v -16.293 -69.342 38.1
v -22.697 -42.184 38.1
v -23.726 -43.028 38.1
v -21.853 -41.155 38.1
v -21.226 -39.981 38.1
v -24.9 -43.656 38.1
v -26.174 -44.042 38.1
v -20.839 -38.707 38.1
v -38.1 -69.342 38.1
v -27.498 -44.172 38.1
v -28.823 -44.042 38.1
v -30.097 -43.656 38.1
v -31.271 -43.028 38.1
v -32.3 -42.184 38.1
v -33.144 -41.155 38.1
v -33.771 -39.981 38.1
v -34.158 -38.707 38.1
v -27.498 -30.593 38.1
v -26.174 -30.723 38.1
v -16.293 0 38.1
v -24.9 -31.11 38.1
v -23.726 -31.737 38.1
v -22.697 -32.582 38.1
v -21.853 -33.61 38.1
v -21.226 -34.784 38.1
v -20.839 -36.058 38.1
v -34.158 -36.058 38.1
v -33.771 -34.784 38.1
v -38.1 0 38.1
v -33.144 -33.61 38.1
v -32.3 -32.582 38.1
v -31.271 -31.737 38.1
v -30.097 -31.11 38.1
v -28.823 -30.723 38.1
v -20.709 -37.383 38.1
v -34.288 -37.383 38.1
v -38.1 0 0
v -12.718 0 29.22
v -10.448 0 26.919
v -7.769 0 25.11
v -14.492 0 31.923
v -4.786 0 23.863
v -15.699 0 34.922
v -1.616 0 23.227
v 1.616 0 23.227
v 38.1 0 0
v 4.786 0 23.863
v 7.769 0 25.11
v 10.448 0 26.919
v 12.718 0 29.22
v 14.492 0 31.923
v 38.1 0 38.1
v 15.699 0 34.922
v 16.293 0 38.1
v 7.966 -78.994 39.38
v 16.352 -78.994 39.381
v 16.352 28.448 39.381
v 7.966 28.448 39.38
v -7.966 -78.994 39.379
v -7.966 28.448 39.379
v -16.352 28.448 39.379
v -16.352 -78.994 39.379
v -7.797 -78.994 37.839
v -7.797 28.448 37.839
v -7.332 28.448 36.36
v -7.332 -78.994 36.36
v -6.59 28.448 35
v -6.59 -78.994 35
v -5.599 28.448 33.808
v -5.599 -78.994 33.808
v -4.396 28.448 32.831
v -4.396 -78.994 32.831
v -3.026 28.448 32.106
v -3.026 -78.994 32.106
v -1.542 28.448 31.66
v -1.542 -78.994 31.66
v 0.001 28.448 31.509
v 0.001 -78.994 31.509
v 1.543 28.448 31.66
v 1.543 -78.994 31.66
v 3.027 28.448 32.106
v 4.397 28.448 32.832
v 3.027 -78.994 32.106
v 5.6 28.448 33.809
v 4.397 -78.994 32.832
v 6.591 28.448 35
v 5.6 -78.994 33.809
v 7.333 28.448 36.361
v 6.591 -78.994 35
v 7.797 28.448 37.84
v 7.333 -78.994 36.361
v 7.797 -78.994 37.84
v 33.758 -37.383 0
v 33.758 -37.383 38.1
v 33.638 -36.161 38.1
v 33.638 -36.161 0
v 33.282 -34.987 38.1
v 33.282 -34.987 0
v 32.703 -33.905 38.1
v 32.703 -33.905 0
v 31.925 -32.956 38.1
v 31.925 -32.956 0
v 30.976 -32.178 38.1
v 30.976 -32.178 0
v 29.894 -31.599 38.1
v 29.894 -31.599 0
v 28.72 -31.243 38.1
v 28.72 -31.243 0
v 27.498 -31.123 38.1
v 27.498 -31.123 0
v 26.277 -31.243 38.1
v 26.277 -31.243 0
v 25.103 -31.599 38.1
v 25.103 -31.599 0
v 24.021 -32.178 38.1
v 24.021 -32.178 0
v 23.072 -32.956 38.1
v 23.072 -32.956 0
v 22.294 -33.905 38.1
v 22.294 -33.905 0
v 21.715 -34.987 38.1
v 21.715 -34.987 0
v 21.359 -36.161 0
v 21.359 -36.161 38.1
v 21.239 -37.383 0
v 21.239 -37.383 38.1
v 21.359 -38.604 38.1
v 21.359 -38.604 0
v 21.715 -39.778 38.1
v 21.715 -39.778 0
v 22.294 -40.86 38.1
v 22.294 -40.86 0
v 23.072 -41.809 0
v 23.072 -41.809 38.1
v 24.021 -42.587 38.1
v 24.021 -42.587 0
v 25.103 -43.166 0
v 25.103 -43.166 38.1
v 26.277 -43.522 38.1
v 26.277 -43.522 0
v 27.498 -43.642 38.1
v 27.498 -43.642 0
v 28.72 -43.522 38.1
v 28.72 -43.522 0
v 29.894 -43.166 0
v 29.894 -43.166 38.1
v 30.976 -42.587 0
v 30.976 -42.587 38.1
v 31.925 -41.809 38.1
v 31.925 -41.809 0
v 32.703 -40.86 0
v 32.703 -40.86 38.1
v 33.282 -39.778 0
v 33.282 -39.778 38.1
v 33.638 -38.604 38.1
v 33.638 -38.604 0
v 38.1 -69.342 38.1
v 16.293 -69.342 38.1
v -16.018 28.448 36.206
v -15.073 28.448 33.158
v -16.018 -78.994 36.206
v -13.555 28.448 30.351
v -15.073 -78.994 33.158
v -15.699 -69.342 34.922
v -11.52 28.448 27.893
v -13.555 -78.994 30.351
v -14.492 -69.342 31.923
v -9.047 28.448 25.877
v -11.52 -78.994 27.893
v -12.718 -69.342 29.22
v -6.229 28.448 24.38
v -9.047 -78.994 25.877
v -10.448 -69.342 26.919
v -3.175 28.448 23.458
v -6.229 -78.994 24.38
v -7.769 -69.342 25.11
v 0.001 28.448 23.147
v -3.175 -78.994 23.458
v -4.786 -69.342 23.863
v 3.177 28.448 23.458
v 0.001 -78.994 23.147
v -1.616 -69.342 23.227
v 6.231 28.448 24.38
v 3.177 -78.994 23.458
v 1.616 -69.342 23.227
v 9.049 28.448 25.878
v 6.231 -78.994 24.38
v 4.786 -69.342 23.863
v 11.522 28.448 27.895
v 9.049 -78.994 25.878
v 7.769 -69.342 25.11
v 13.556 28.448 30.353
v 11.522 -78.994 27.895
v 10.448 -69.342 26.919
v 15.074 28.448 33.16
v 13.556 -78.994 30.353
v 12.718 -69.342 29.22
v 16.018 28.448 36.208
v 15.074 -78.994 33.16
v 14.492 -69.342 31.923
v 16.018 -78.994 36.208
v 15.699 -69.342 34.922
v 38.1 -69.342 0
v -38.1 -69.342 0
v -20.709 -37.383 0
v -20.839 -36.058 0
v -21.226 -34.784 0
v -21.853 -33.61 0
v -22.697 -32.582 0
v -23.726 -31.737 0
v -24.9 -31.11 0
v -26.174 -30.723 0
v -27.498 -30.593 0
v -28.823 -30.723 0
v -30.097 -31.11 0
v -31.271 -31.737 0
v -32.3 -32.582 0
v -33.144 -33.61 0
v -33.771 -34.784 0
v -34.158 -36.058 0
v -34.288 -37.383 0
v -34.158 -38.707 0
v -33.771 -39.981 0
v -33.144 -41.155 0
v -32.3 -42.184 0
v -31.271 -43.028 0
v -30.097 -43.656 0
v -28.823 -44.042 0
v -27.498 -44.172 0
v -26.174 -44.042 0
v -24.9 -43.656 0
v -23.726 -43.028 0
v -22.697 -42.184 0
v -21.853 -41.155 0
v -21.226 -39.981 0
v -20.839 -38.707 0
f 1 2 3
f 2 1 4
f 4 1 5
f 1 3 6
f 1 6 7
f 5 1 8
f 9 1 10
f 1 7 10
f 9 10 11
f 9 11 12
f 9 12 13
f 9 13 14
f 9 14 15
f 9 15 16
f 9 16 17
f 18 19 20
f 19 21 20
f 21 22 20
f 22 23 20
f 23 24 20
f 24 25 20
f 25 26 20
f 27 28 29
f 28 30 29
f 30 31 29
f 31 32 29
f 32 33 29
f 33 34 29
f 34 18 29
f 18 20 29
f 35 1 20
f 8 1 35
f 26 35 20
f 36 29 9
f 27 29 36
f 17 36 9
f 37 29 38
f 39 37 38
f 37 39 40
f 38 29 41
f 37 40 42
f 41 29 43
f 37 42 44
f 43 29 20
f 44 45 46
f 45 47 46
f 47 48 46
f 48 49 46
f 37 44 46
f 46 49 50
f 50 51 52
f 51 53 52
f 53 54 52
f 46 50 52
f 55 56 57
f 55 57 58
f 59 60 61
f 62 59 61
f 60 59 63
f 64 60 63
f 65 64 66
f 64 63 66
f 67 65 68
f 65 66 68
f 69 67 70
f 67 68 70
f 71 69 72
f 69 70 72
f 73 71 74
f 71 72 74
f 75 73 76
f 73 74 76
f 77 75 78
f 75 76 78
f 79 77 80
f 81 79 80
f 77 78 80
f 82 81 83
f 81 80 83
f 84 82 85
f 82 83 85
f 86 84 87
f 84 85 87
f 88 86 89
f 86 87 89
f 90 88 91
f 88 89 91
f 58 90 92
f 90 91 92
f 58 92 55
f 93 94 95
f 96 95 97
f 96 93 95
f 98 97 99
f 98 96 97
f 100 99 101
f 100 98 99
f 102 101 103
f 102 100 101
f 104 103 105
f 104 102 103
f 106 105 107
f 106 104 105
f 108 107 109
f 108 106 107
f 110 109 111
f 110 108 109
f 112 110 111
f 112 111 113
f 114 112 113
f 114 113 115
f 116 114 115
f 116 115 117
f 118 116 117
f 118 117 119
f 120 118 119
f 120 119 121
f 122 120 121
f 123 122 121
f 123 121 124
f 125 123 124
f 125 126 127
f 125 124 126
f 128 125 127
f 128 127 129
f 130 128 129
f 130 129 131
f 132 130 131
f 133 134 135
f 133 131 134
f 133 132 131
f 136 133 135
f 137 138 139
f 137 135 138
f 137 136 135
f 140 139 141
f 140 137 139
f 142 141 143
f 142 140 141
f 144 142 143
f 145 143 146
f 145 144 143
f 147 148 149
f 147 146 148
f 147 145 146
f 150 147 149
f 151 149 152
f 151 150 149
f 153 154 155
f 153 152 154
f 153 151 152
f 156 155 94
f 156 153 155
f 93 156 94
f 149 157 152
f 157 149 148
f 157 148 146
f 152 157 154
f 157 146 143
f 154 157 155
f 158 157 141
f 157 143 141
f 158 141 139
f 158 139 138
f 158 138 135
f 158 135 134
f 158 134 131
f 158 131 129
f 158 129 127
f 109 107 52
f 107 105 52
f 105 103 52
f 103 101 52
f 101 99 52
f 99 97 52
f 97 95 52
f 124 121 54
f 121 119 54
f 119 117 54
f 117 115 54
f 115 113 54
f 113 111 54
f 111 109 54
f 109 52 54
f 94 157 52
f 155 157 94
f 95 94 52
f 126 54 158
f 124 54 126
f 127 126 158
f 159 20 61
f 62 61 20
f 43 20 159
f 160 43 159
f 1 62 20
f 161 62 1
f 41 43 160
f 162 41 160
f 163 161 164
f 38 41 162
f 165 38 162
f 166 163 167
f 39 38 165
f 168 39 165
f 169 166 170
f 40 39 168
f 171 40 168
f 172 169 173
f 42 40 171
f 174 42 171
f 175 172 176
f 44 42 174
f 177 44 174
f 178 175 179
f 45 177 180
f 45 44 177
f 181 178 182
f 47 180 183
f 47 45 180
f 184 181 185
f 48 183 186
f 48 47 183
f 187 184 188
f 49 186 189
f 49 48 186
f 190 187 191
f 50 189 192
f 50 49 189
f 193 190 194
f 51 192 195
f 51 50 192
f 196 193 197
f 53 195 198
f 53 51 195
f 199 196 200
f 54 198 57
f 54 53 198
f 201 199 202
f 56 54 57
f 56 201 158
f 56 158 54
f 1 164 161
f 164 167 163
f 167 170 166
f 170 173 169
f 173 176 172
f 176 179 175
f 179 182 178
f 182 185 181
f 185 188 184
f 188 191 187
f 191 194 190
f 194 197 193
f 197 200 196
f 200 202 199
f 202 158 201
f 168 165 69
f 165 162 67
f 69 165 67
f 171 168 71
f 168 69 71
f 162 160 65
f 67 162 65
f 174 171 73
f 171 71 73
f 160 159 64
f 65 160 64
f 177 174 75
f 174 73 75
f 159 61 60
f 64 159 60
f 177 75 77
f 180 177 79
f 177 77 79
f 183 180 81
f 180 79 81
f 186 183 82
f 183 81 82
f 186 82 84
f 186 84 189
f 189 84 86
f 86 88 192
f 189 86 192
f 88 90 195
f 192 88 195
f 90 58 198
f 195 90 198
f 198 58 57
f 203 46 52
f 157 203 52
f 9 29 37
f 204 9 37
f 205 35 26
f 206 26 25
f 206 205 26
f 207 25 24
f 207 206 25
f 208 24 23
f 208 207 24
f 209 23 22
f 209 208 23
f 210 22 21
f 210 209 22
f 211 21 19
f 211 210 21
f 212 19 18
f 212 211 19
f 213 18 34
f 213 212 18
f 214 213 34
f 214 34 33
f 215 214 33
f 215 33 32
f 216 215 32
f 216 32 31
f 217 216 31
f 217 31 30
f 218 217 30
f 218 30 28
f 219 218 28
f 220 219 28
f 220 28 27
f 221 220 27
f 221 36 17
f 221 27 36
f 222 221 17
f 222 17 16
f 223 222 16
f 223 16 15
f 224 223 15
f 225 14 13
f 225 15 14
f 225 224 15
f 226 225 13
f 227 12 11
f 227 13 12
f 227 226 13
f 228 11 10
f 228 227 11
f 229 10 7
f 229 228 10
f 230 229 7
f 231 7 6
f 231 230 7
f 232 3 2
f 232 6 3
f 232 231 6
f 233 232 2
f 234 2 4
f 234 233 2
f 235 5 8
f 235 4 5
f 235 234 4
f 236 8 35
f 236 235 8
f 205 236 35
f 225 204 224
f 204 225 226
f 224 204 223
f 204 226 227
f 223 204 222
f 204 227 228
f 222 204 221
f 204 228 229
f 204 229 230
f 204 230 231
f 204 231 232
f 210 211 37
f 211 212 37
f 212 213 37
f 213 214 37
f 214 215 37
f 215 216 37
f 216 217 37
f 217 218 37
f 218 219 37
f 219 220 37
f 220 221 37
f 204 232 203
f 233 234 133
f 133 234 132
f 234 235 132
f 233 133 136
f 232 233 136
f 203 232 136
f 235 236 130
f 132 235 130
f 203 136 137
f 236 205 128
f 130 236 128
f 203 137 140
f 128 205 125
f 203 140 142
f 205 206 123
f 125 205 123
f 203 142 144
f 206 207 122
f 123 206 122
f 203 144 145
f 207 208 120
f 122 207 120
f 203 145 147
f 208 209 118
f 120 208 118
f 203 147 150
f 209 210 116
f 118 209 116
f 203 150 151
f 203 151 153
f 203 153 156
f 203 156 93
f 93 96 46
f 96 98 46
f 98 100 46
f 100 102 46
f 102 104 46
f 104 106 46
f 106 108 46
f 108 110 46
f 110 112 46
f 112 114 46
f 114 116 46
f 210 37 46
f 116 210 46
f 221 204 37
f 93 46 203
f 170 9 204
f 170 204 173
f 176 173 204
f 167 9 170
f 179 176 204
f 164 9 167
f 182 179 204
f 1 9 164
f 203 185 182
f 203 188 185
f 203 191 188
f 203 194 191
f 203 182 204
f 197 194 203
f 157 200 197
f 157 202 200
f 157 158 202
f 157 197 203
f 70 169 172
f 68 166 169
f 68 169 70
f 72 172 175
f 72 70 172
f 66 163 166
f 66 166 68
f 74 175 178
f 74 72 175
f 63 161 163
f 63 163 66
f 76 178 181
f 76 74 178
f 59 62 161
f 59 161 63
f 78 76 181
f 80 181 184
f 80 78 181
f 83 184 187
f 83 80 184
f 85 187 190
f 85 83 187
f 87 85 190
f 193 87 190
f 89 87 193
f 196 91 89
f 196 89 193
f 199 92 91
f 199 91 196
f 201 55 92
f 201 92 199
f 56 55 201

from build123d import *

# Parameters (mm, degrees)
F1_DEPTH = 69.342
F4_DEPTH = 107.442
F6_DEPTH = 136.652
F7_R     = 6.789737
F7_R_2   = 6.259827
F8_DEPTH = 85.344


with BuildPart() as f1:
    # F0 (on Front) → F1 (new body)
    with BuildSketch(Plane.XZ):
        Polygon((0, 38.1), (-38.1, 38.1), (-38.1, 0), (0, 0), (38.1, 0), (38.1, 38.1), align=None)
    extrude(amount=F1_DEPTH)

    # F3 (on offset) → F4 (join)
    with BuildSketch(Plane.XZ.offset(78.994)):
        with BuildLine():
            Line((16.352327, 39.380998), (-16.352311, 39.378844))
            ThreePointArc((-16.352311, 39.378844), (0.001077, 23.146536), (16.352327, 39.380998))
        make_face()
    extrude(amount=-F4_DEPTH)

    # F5 (on offset) → F6 (cut)
    with BuildSketch(Plane.XZ.offset(78.994)):
        with BuildLine():
            Line((0, 39.475866), (-7.966925, 39.475866))
            ThreePointArc((-7.966925, 39.475866), (-0.026347, 31.508984), (7.966751, 39.423171))
            Line((7.966751, 39.423171), (0, 39.475866))
        make_face()
    extrude(amount=-F6_DEPTH, mode=Mode.SUBTRACT)

    # F7 (on Top) → F8 (cut)
    with BuildSketch(Plane.XY):
        with Locations((-27.498437, -37.382606)):
            Circle(F7_R)
        with Locations((27.498439, -37.382606)):
            Circle(F7_R_2)
    extrude(amount=F8_DEPTH, mode=Mode.SUBTRACT)


solid = f1.part
